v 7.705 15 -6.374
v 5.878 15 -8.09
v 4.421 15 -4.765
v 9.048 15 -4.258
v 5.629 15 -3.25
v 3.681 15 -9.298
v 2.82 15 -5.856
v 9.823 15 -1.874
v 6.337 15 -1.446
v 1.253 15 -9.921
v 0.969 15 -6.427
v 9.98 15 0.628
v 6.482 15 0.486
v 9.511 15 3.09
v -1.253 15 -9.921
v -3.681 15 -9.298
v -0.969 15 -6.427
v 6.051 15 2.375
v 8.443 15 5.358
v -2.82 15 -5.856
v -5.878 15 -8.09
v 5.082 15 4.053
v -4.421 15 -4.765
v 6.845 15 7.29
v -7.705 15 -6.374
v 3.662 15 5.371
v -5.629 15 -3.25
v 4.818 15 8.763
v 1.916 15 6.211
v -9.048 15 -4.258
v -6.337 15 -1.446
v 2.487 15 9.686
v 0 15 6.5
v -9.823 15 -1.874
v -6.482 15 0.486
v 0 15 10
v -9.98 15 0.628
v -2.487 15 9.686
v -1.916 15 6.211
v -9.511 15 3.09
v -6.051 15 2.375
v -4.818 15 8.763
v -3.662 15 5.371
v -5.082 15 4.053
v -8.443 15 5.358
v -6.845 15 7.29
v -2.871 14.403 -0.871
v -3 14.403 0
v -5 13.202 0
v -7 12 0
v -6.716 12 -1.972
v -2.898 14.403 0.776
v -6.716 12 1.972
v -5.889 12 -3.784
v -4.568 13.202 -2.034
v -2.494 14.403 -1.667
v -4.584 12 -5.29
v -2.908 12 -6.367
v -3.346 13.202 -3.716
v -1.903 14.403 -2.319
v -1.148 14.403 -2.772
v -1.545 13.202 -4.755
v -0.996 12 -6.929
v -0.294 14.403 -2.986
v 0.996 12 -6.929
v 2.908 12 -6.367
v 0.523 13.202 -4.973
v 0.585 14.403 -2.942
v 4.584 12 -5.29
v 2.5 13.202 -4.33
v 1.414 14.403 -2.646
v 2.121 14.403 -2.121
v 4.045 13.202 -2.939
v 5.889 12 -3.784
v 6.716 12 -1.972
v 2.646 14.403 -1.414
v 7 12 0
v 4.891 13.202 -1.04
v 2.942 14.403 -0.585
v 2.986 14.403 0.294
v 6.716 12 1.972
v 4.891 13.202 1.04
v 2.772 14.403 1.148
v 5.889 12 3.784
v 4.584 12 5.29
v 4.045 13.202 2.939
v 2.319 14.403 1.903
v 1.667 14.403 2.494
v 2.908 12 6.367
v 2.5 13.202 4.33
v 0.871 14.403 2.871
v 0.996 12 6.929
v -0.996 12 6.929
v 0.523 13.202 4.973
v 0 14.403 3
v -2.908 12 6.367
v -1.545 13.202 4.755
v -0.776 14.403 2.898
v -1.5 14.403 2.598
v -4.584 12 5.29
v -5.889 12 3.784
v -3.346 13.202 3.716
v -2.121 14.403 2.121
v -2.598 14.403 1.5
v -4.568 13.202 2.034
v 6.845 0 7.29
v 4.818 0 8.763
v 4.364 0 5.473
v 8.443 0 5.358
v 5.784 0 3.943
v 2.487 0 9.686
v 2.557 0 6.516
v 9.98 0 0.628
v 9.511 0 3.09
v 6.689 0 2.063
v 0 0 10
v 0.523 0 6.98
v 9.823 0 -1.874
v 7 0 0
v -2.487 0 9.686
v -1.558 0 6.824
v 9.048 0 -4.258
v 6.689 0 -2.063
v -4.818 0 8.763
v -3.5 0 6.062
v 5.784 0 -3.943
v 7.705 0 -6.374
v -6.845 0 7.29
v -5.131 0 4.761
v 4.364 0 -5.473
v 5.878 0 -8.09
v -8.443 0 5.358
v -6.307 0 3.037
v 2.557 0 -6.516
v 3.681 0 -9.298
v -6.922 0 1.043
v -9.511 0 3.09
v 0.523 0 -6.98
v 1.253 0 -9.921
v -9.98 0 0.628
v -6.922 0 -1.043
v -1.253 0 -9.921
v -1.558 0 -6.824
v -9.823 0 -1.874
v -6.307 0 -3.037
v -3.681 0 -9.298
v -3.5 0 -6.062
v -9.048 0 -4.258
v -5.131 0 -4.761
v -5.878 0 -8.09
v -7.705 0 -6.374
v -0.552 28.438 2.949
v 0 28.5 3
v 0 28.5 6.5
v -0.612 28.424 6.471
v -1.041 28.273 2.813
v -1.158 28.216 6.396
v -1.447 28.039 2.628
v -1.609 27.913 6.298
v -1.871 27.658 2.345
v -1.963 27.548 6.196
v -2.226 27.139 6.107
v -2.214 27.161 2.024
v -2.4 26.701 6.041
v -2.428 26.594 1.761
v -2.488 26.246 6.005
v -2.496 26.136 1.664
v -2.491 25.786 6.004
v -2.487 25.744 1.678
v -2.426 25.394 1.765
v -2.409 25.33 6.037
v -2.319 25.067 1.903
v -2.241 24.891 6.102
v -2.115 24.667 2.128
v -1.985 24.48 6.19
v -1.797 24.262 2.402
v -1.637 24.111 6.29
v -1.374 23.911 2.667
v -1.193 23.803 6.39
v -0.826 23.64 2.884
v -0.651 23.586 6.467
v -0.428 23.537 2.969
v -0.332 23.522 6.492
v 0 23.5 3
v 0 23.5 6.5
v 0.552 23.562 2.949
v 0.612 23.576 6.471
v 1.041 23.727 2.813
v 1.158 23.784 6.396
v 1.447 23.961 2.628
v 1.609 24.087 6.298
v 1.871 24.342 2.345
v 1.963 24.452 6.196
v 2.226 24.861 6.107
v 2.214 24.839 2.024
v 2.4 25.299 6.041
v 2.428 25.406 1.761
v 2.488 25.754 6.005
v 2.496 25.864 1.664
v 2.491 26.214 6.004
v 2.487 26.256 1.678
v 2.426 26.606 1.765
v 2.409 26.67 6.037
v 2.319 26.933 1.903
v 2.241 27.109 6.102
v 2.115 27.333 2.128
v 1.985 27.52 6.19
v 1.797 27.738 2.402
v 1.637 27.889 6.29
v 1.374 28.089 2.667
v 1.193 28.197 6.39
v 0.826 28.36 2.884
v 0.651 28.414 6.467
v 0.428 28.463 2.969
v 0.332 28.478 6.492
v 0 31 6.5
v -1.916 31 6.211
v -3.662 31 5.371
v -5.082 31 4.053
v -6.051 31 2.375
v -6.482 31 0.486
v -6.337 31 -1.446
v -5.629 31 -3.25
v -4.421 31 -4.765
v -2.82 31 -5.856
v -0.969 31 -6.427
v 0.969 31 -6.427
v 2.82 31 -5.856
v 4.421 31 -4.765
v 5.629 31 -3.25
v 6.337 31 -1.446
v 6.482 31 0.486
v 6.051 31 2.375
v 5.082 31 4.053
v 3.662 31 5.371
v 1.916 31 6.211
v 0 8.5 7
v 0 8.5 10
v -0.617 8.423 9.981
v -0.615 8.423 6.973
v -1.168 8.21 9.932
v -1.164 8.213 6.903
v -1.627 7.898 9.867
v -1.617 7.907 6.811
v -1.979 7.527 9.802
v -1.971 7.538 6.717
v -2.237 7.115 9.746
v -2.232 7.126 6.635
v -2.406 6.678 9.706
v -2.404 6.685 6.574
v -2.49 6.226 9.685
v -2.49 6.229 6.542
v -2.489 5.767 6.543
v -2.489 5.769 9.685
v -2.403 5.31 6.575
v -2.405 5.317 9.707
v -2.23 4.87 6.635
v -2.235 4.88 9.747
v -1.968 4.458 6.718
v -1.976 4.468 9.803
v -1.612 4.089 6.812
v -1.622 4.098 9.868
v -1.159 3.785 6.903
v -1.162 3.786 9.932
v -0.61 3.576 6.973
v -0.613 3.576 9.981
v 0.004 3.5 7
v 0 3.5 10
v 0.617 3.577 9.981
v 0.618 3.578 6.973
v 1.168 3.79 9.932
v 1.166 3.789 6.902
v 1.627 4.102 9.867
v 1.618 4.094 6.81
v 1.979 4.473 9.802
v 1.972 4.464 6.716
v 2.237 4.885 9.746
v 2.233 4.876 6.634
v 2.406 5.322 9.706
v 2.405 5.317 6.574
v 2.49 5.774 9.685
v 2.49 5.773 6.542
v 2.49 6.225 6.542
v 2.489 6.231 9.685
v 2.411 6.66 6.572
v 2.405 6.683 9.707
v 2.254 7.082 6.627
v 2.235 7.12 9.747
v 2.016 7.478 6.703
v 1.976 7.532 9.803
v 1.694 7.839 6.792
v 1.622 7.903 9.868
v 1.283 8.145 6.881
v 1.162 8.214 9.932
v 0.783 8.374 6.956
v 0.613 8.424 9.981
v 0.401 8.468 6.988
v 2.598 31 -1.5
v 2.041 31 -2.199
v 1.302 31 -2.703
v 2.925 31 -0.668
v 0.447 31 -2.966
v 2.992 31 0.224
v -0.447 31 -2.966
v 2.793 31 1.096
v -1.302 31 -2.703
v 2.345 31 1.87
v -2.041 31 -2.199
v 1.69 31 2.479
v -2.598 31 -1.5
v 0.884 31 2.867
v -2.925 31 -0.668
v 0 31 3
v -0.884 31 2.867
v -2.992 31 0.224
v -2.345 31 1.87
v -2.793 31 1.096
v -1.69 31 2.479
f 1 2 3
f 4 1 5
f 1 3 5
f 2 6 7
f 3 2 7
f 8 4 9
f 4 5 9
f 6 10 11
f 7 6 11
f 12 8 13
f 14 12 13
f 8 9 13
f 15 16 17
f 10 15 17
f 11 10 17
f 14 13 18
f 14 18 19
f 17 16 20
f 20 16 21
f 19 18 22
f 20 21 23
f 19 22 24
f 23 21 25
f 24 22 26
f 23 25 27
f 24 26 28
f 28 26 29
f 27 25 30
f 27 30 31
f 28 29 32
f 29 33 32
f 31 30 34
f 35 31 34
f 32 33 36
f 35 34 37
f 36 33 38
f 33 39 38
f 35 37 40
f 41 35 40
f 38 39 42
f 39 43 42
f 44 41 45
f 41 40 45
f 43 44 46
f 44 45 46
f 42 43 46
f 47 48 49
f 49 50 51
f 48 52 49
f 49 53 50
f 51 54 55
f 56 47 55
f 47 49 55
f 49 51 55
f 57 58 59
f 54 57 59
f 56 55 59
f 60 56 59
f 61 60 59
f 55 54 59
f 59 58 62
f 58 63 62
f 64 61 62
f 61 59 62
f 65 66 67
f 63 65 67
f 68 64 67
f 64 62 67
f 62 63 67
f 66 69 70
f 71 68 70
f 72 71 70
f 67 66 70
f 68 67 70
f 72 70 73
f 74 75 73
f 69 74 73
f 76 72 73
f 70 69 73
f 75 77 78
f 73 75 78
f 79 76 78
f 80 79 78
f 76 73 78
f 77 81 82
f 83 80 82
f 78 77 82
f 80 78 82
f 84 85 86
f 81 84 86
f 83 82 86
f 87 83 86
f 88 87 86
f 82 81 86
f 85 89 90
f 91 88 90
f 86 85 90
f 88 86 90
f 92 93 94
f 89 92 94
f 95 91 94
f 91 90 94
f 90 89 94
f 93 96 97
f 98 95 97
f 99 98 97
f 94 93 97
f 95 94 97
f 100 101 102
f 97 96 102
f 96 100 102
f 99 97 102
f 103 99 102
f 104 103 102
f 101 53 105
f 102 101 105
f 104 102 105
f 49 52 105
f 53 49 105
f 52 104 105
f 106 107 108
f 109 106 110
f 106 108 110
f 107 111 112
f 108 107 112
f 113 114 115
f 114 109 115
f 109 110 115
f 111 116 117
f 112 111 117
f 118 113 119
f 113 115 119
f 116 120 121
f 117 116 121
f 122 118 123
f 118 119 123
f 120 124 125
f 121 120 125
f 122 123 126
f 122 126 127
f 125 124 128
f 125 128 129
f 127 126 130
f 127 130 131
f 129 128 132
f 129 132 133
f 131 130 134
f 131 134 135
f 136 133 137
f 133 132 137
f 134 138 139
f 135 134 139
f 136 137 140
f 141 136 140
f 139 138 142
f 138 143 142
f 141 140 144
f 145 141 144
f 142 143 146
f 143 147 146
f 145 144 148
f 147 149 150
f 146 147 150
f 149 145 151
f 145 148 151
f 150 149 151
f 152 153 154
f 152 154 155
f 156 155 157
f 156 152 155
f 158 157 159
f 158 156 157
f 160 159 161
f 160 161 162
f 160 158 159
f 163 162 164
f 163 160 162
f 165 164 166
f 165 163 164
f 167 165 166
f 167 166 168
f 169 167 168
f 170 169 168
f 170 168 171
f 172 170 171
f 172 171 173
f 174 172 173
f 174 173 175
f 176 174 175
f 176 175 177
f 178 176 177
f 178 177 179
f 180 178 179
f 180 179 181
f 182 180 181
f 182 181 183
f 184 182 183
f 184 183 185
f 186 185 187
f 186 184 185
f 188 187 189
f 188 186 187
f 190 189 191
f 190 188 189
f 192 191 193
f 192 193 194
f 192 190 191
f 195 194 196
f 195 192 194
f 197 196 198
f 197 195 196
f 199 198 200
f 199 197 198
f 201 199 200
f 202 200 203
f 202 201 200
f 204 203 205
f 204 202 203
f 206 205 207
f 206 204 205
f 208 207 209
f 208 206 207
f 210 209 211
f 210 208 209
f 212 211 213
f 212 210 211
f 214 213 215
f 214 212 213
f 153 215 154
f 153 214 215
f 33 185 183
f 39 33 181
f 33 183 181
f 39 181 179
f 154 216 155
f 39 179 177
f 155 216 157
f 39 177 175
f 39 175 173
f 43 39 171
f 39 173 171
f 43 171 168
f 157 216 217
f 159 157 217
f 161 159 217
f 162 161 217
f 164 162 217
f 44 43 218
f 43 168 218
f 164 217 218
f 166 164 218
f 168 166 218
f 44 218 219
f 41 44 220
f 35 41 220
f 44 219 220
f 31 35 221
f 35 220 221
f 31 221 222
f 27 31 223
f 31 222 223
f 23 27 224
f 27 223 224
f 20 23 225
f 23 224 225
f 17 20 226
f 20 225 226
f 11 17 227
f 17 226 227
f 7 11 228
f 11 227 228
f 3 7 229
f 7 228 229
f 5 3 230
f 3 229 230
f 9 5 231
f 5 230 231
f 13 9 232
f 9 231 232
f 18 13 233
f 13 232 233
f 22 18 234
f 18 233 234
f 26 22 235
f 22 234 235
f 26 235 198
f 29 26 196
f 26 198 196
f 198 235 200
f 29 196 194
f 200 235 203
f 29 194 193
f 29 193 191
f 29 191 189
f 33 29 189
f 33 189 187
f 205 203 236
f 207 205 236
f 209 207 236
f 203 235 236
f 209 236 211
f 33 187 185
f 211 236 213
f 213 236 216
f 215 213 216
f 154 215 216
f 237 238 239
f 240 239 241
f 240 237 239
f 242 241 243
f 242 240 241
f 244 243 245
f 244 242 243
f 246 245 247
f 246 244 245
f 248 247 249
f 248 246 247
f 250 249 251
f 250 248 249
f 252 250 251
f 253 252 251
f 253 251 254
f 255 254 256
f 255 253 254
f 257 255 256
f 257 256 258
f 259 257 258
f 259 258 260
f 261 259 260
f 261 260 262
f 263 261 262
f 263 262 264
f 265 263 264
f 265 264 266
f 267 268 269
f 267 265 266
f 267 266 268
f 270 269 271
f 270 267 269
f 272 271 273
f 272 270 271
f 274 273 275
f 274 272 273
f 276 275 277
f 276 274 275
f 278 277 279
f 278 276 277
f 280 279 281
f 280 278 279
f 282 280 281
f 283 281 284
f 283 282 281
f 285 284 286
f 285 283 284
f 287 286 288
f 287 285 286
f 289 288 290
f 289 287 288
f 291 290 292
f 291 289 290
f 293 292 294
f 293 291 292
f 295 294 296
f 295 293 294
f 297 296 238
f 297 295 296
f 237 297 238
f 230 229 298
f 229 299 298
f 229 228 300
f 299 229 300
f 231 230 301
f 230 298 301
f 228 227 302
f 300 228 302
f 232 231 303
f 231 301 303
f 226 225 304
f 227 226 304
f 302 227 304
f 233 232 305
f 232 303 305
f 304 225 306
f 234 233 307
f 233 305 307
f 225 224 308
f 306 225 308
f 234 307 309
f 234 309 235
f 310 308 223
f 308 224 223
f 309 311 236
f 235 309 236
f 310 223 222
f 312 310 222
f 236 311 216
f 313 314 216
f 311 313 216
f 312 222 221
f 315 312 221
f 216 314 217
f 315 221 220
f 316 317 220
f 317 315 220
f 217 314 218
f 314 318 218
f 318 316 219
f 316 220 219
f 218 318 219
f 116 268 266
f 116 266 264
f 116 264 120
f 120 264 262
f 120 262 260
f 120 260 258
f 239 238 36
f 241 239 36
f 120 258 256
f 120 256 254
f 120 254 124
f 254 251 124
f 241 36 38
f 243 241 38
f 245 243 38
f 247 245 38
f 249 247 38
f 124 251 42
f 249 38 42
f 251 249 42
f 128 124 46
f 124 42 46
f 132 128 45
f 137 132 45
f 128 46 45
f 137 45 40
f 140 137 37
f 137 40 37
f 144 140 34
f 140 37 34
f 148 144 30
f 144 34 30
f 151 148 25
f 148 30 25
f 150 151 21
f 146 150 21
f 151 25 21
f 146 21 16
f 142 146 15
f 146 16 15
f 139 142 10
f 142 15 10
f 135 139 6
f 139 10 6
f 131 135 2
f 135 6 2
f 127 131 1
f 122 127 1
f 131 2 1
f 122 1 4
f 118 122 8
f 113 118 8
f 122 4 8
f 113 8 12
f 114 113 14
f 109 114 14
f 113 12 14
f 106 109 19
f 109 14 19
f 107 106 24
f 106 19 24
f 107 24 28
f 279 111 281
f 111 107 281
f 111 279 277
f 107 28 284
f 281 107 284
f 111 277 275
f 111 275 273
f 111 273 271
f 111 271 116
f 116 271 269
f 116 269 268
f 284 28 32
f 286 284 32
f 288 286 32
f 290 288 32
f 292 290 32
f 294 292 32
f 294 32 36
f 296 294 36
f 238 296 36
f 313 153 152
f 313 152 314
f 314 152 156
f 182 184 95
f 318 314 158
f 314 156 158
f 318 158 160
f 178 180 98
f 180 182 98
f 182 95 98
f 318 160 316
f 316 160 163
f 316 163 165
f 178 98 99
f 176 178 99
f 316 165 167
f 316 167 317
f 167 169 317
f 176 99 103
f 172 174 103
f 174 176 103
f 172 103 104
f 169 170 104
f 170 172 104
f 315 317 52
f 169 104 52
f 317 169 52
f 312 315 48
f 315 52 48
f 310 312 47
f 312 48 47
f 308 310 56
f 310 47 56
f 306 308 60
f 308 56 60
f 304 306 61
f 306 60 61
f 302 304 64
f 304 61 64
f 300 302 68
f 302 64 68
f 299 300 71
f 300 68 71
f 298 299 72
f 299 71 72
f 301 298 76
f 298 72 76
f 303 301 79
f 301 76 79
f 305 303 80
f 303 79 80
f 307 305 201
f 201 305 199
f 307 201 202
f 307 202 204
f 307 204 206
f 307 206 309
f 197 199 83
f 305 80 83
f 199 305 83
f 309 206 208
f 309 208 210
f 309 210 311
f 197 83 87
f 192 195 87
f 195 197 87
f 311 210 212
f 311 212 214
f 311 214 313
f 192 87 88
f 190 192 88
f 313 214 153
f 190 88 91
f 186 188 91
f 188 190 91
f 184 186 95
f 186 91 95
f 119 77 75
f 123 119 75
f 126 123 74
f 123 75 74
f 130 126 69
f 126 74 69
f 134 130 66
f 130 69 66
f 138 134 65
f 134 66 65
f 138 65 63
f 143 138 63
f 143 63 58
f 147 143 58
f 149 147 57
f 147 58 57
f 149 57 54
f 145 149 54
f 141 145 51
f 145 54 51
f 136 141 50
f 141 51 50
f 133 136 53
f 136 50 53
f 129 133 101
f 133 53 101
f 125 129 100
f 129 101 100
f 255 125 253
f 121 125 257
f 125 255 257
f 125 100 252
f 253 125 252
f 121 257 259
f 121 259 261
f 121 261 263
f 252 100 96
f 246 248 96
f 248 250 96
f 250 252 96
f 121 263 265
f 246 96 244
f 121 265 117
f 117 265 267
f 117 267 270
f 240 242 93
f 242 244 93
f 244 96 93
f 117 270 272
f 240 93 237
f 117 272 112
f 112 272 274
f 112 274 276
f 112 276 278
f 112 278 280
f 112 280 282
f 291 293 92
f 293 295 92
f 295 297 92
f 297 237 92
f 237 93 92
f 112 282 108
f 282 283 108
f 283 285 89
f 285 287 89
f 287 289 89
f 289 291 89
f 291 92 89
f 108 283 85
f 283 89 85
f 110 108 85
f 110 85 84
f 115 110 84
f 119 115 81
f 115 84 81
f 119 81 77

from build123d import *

# Parameters (mm, degrees)
TROU_TARAUD_M14X1_51_D     = 14
TROU_TARAUD_M14X1_51_DEPTH = 12
TROU_TARAUD_M14X1_51_TIP   = 4.206024333
TROU_TARAUD_M61_AT_2_COUNT = 2
TROU_TARAUD_M61_AT_2_PITCH = 20


with BuildPart() as part:
    # Esquisse1 → Révolution1 (revolve)
    with BuildSketch(Plane.XY, mode=Mode.PRIVATE) as r_volution1_sk:
        Polygon((-6.5, 31), (-3, 31), (-3, 0), (-10, 0), (-10, 15), (-6.5, 15), align=None)
    revolve(r_volution1_sk.sketch.rotate(Axis((0, 39.529907563, 0), (0, -1, 0)), 270), axis=Axis((0, 39.529907563, 0), (0, -1, 0)))

    # Trou taraudé M14x1.51
    with Locations(Plane(origin=(0, 0, 0), x_dir=(-1, 0, 0), z_dir=(0, -1, 0))):
        with Locations((0, 0)):
            Hole(TROU_TARAUD_M14X1_51_D / 2, depth=TROU_TARAUD_M14X1_51_DEPTH)
            with Locations((0, 0, -(TROU_TARAUD_M14X1_51_DEPTH + TROU_TARAUD_M14X1_51_TIP / 2))):  # 118° drill point
                Cone(0, TROU_TARAUD_M14X1_51_D / 2, TROU_TARAUD_M14X1_51_TIP, mode=Mode.SUBTRACT)

    # Esquisse7 → Trou taraudé M61 (revolve, cut)
    with BuildSketch(Plane(origin=(0, 6, 0), x_dir=(0, 1, 0), z_dir=(1, 0, 0))):
        Polygon((0, 0), (0, 17.502151548), (2.5, 16), (2.5, 0), align=None)
    trou_taraud_m61 = revolve(axis=Axis((0, 6, -6.35), (0, 0, 1)), mode=Mode.SUBTRACT)

    # Trou taraudé M61 at 2: Trou taraudé M61 ×2
    with Locations(*[(0, i * TROU_TARAUD_M61_AT_2_PITCH, 0) for i in range(1, TROU_TARAUD_M61_AT_2_COUNT)]):
        add(trou_taraud_m61, mode=Mode.SUBTRACT)


solid = part.part
